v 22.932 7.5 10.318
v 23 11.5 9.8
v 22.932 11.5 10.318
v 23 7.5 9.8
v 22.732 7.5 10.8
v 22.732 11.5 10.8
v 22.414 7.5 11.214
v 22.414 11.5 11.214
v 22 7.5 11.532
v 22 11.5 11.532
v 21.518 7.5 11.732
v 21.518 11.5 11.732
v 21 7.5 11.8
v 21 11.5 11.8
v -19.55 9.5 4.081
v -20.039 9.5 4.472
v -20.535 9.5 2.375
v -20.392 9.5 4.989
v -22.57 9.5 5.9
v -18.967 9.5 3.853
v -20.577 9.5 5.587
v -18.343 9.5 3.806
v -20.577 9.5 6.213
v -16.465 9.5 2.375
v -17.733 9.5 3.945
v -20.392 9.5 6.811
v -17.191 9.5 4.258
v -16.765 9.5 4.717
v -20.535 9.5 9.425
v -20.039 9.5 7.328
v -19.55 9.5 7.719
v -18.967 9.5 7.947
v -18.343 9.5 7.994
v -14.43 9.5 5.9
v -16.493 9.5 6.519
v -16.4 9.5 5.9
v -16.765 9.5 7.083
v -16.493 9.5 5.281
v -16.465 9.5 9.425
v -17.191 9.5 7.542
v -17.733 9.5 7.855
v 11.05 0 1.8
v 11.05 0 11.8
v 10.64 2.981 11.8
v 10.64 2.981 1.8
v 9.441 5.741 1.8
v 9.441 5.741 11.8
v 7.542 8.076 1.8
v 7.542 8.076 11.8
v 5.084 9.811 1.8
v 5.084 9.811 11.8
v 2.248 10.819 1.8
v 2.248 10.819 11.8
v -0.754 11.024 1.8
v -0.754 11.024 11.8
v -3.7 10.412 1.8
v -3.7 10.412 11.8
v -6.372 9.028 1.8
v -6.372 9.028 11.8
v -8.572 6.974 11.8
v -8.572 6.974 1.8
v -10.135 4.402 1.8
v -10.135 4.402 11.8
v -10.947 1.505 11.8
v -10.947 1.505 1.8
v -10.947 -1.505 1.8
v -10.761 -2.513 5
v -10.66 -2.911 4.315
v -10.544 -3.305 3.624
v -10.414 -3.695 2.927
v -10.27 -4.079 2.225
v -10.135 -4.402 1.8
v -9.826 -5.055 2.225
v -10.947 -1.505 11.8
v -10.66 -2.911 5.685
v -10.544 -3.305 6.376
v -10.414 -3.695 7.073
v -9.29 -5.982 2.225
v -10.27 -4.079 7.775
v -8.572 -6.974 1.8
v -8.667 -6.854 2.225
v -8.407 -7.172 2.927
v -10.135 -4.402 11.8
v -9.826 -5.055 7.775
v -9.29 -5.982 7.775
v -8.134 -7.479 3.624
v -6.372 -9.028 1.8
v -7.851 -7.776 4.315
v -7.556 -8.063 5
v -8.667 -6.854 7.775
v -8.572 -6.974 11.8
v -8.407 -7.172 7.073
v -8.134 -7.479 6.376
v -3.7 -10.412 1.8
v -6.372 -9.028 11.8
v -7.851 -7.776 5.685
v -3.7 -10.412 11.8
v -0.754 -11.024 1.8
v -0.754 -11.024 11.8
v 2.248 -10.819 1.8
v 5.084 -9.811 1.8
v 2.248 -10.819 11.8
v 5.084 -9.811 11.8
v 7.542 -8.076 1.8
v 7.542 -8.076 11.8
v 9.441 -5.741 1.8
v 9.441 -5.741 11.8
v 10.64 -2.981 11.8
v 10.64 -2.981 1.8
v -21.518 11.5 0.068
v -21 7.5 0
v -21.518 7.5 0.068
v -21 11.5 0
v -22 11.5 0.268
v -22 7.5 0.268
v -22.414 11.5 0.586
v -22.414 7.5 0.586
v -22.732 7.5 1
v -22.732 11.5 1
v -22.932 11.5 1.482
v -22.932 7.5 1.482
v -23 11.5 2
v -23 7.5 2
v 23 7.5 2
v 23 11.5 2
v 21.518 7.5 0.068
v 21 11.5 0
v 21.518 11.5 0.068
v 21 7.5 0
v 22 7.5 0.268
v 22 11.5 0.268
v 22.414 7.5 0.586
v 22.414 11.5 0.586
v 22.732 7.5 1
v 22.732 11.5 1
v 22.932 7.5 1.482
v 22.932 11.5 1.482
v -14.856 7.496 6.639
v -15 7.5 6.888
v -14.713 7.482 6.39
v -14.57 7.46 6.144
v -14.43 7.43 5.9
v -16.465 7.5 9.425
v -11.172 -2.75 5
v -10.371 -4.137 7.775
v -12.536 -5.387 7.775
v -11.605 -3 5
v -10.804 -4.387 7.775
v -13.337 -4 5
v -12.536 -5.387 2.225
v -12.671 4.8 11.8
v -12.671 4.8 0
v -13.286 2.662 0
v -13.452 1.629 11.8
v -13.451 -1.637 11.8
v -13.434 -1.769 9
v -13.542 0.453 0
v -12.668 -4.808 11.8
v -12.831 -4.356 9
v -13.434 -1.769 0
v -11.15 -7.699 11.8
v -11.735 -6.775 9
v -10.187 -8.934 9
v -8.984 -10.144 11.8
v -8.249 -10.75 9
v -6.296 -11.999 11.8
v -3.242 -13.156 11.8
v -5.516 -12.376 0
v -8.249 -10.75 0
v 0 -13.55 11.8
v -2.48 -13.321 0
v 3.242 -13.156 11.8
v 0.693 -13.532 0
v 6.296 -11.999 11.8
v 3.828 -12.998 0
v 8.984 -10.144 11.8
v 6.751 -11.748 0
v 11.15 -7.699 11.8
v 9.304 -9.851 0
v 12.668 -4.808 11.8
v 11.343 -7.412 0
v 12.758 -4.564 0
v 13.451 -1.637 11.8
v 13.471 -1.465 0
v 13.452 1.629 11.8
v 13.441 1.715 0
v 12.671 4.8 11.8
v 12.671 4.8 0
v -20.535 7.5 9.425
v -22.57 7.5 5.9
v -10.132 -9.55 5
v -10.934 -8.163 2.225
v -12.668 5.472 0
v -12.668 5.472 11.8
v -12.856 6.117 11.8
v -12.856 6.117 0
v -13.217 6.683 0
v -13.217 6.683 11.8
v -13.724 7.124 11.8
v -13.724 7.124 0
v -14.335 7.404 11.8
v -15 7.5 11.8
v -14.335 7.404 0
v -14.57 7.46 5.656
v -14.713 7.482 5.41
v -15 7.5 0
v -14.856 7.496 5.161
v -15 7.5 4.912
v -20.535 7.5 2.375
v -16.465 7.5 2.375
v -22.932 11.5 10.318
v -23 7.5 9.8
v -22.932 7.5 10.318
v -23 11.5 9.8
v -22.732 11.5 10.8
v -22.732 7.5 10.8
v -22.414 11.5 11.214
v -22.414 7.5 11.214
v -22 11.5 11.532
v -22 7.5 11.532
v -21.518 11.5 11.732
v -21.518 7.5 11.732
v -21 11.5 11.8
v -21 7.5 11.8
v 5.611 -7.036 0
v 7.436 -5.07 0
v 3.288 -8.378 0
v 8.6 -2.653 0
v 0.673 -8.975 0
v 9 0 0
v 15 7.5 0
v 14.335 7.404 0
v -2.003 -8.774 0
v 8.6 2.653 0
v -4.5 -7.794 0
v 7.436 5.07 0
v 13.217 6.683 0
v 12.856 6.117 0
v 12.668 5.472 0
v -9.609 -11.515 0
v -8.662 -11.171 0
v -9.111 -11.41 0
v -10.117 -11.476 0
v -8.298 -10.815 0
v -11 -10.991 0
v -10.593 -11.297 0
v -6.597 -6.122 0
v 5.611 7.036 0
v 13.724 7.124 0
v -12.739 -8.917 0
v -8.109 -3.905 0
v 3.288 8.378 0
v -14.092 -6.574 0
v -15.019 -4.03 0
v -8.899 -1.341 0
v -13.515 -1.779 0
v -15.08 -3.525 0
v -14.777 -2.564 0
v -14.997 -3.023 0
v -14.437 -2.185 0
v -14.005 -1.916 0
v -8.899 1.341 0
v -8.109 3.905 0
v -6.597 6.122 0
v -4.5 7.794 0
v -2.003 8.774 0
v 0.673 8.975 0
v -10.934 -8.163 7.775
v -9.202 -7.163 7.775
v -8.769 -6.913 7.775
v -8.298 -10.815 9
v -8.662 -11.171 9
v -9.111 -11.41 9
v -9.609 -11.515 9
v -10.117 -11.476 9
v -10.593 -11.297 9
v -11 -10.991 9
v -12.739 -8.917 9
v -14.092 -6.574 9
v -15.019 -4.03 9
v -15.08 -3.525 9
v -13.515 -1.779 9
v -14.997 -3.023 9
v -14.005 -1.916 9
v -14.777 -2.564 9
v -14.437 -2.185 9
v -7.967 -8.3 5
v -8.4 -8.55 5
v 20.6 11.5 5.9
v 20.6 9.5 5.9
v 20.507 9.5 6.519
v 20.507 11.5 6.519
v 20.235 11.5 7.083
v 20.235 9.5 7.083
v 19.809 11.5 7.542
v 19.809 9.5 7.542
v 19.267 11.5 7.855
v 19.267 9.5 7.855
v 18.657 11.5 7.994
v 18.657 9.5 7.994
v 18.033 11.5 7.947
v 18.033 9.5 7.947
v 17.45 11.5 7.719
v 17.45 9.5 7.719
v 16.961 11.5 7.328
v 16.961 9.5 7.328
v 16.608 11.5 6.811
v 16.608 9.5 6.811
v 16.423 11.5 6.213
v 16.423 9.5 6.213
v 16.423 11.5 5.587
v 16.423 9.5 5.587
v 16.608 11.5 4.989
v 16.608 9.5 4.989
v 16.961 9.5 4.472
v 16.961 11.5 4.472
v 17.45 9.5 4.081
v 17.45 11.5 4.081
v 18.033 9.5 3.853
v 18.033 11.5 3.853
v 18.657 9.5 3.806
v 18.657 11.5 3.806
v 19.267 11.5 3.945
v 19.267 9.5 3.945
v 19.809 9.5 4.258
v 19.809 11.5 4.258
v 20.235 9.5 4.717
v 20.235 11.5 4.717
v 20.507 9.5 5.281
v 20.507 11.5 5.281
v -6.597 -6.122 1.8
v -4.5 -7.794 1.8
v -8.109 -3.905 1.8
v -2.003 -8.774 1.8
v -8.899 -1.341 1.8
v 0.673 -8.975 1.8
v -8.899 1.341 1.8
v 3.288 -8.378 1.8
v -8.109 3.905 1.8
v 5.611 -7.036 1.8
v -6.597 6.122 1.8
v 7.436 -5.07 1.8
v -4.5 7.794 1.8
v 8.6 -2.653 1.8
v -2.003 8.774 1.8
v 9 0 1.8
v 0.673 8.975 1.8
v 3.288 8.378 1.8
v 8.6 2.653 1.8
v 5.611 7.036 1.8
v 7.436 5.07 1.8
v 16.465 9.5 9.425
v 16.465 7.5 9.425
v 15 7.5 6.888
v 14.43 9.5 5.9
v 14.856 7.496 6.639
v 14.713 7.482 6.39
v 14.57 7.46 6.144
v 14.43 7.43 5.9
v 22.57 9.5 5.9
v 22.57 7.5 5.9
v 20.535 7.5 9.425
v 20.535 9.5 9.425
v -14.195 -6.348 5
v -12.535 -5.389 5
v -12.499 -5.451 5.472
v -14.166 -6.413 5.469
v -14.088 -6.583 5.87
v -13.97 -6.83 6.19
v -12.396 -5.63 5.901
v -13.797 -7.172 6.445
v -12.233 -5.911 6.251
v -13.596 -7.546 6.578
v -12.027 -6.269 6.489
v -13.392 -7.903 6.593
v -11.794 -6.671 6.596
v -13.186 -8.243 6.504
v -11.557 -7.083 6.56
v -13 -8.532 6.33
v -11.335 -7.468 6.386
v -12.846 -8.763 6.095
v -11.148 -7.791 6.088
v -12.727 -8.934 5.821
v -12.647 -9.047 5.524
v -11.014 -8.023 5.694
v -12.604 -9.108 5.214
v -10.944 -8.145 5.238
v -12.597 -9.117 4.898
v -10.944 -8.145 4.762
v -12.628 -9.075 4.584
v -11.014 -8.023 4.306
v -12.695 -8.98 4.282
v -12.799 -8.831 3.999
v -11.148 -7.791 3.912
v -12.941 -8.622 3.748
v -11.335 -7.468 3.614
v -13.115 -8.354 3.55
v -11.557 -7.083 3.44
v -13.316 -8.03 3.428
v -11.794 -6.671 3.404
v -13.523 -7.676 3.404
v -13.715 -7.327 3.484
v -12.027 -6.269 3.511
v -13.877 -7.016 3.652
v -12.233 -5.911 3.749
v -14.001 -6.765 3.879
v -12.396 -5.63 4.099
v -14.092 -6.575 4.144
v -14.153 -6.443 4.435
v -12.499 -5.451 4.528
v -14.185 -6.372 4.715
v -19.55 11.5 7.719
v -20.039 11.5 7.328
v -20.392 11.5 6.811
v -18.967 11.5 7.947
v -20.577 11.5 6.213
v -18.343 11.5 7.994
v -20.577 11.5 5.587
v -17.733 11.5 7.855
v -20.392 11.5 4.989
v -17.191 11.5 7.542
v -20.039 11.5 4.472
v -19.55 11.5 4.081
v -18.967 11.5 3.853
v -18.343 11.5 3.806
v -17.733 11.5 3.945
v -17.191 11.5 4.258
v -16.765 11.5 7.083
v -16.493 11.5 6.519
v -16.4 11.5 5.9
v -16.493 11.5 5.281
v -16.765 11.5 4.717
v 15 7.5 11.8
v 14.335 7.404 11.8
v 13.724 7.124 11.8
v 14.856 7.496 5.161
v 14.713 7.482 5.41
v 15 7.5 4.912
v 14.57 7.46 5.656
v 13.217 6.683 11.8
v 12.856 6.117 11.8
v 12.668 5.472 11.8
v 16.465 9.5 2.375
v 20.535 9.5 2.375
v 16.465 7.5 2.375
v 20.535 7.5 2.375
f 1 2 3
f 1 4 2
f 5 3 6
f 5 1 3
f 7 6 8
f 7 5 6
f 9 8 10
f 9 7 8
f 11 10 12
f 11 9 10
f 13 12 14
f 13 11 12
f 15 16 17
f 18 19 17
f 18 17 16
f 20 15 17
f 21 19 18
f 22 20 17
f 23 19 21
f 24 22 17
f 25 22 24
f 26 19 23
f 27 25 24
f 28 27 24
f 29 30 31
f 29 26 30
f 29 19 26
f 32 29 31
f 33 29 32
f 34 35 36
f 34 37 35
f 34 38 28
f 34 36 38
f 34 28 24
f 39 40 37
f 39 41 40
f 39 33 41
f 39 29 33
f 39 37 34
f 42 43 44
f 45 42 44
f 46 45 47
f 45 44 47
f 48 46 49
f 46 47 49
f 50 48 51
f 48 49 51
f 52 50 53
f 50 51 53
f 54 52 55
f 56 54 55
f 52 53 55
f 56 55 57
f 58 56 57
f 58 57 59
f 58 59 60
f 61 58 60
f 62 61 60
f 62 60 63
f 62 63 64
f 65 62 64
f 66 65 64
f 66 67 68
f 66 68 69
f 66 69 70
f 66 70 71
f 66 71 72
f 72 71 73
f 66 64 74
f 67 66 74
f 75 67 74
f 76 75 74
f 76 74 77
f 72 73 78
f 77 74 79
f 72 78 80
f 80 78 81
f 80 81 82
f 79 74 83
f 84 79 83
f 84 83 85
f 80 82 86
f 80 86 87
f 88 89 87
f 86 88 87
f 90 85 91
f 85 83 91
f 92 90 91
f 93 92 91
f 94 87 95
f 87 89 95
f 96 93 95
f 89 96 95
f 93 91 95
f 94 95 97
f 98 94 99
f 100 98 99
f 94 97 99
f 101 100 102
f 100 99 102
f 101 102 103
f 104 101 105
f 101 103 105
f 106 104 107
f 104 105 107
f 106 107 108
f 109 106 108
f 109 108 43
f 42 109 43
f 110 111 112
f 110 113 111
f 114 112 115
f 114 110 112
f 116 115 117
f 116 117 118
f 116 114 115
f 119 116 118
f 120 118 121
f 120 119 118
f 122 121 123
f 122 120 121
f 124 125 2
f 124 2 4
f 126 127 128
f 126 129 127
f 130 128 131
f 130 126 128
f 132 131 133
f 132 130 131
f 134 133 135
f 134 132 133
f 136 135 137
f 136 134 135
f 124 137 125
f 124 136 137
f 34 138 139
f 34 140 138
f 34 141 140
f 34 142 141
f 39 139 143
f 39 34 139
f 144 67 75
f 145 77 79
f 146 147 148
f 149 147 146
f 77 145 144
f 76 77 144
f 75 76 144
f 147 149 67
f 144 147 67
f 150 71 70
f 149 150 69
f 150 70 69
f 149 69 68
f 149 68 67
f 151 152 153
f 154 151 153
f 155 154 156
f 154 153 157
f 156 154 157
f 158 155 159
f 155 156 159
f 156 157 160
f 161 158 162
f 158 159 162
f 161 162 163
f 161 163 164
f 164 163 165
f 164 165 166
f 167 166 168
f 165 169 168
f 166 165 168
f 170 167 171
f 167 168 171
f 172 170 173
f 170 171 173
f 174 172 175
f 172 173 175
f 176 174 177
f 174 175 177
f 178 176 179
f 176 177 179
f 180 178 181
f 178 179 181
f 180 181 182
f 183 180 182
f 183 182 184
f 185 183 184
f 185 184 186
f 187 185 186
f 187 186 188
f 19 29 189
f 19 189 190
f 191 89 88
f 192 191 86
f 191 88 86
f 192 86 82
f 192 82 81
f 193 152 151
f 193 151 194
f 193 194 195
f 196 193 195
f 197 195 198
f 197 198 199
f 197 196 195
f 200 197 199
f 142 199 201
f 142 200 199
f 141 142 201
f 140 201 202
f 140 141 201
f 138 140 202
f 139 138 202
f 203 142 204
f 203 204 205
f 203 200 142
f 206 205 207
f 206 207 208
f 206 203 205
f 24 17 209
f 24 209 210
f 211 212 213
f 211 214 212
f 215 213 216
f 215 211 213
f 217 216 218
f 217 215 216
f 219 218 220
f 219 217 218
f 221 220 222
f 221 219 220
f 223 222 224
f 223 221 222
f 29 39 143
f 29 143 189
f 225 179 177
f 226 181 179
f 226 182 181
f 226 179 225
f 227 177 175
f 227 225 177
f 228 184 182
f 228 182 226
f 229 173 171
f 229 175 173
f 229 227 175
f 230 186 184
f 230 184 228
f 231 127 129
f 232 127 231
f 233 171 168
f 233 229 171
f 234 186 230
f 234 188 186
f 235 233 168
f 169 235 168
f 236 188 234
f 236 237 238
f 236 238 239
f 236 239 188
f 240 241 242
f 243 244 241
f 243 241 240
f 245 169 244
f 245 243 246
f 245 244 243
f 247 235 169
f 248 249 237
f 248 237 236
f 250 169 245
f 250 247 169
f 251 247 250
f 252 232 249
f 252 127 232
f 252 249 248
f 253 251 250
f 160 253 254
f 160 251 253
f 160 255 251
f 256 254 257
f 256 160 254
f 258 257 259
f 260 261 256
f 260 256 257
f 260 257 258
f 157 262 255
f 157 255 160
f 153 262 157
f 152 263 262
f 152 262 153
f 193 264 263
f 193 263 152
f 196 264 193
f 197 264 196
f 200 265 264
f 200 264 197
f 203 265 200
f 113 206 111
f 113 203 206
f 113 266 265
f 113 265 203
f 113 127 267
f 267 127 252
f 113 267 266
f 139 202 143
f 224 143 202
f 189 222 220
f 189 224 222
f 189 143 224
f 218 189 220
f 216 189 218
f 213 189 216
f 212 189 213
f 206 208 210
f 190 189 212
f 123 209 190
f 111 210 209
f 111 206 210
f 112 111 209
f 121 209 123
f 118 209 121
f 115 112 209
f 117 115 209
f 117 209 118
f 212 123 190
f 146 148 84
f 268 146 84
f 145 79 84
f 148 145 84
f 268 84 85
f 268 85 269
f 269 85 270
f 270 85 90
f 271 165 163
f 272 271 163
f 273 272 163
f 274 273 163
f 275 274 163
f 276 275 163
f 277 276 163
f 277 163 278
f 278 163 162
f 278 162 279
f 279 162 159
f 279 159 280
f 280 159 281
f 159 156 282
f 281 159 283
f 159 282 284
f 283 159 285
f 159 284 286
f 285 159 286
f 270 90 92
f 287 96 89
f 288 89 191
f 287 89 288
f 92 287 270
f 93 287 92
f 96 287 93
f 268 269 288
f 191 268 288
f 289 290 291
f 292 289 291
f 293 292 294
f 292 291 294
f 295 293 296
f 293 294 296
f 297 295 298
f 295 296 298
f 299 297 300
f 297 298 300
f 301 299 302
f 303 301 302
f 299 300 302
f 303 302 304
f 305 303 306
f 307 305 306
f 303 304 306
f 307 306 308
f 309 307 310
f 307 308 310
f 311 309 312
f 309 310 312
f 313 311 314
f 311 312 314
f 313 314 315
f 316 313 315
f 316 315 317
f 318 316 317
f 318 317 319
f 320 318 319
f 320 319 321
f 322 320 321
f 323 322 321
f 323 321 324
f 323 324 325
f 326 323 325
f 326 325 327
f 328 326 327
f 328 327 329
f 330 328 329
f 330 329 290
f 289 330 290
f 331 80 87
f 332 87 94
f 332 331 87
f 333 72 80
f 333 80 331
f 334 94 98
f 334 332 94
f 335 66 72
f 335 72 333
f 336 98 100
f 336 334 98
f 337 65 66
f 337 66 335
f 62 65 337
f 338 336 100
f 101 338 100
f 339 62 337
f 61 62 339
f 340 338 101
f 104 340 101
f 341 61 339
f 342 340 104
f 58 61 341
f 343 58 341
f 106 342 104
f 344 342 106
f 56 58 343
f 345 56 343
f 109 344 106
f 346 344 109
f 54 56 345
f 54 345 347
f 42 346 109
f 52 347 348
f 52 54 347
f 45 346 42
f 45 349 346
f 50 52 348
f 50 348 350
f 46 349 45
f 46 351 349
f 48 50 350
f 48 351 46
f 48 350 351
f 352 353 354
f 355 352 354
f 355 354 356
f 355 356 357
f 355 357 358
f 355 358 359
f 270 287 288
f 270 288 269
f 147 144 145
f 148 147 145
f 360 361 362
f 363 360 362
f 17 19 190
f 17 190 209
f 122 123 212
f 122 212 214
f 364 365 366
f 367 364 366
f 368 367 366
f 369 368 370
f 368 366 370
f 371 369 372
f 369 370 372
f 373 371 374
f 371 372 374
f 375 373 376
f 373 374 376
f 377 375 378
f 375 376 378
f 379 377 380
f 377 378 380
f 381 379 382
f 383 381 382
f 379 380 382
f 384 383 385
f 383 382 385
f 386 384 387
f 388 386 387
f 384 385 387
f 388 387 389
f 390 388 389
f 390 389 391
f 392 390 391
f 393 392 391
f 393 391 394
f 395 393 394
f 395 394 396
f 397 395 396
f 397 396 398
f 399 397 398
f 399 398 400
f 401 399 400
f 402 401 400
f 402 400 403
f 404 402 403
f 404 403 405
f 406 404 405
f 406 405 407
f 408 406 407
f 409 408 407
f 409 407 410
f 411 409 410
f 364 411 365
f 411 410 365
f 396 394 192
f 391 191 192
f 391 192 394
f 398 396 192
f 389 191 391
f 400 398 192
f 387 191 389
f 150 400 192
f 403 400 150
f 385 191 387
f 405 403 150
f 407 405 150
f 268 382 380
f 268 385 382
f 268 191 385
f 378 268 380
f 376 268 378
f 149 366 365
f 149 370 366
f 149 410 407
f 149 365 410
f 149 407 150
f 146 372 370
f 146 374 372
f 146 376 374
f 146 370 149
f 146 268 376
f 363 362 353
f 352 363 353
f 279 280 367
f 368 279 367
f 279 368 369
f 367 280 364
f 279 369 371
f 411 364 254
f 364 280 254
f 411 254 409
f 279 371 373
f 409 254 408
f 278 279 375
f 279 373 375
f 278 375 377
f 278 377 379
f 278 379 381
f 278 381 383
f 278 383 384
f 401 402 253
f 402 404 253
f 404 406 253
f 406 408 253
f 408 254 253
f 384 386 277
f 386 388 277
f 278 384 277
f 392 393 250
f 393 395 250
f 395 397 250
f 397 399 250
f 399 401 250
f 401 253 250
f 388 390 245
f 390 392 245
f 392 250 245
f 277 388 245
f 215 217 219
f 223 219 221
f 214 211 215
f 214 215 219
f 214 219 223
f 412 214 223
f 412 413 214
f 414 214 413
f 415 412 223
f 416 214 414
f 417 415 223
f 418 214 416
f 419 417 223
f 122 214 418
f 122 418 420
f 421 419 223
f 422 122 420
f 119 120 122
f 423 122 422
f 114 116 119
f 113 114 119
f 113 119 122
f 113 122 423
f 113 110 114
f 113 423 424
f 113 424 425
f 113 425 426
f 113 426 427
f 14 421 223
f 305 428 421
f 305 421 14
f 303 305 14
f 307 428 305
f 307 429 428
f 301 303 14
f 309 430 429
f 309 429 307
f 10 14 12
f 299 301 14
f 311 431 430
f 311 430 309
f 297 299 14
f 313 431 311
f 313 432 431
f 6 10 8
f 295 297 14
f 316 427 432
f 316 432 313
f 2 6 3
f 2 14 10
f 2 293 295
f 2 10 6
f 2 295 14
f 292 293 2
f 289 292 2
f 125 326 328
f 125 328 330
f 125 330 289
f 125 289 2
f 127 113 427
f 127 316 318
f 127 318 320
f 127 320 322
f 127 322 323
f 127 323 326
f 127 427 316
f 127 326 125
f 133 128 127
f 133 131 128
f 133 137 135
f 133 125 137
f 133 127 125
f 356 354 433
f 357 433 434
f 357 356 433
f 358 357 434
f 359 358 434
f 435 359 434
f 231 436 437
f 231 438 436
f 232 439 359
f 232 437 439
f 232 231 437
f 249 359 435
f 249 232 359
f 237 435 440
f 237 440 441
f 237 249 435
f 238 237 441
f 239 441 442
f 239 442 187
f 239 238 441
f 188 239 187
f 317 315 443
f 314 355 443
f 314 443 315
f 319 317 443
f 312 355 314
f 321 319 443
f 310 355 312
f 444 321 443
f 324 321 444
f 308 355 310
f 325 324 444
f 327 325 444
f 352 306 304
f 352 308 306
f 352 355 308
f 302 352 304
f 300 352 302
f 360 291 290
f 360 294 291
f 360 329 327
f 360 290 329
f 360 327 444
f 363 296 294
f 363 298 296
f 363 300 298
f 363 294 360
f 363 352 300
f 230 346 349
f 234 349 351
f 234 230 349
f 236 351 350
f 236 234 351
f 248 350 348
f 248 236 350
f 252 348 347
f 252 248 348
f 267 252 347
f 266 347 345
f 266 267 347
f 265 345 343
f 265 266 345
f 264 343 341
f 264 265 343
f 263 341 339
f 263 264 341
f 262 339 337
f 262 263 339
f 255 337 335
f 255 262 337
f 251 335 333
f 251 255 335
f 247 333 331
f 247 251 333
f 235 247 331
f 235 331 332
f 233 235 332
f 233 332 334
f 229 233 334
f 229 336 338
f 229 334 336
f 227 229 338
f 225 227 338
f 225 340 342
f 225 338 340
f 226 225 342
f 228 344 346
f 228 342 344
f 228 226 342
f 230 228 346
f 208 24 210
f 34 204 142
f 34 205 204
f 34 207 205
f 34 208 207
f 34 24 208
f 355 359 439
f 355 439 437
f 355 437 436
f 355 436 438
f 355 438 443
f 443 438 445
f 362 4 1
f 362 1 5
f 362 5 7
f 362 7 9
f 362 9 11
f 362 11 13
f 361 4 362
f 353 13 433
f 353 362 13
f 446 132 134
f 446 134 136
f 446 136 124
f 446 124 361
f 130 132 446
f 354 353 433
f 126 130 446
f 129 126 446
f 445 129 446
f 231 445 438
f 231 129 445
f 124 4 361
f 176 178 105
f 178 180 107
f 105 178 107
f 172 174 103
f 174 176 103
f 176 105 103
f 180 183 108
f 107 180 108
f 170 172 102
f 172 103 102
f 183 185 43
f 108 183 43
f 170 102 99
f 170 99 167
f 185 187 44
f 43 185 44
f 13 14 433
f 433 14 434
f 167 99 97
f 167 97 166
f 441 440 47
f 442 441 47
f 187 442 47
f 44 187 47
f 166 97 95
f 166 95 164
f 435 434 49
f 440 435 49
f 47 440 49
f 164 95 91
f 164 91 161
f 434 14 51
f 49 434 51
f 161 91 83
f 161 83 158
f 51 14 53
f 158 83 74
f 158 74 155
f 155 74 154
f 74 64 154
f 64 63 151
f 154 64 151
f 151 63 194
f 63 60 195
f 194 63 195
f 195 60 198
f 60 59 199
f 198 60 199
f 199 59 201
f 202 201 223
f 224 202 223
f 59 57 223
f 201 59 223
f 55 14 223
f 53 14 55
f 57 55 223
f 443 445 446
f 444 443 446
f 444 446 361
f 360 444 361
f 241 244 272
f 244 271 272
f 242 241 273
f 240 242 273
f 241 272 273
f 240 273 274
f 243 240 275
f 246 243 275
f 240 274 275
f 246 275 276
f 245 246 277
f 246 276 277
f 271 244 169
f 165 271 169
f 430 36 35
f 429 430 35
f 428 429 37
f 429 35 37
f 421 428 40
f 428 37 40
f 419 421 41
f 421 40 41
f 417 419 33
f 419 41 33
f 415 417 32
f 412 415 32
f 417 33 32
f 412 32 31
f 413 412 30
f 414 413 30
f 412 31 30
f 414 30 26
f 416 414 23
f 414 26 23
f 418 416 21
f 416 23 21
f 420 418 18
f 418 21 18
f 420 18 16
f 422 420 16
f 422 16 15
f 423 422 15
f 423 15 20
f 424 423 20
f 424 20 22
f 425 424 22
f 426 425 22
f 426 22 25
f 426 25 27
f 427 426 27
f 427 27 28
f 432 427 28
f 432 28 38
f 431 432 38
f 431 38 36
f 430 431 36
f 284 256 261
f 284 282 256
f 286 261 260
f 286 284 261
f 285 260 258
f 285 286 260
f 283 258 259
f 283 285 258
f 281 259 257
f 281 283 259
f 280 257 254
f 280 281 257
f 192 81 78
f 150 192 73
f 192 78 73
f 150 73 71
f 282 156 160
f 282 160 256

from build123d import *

# Parameters (mm, degrees)
PAD002_DEPTH    = 5.55
POCKET001_DEPTH = 0.5
POCKET002_DEPTH = 0.5
PAD003_DEPTH    = 2.5
PAD001_DEPTH    = 9
SKETCH_R        = 9
PAD_DEPTH       = 11.8
SKETCH001_R     = 11.05
POCKET_DEPTH    = 10
SKETCH010_R     = 1.6
POCKET003_DEPTH = 5
FILLET_R        = 1.8
SKETCH011_R     = 2.1
POCKET004_DEPTH = 5
POCKET005_DEPTH = 2
FILLET001_R     = 2


with BuildPart() as pad003:
    # Sketch004 → Pad002 (new body)
    with BuildSketch(Plane.XY.offset(2.225)):
        Polygon((-11.1717282118, -2.7499991288), (-7.9674332118, -8.3000008712), (-8.4004459137, -8.5500008712), (-11.6047409137, -2.9999991288), align=None)
    extrude(amount=PAD002_DEPTH)

    # Sketch006 → Pocket001 (cut)
    with BuildSketch(Plane(origin=(-9.5695807118, -5.525, 2.225), x_dir=(-0.5, 0.8660254038, 0), z_dir=(0.8660254038, 0.5, 0))):
        Polygon((-3.204295, 2.7750019602), (-1.6021491347, 5.55), (-3.204295, 5.55), align=None)
        Polygon((1.6021478772, 0), (3.204295, 0), (3.204295, 2.7750019602), align=None)
    extrude(amount=-POCKET001_DEPTH, mode=Mode.SUBTRACT)

    # Sketch008 → Pocket002 (cut)
    with BuildSketch(Plane(origin=(-9.5695807118, -5.525, 2.225), x_dir=(-0.5, 0.8660254038, 0), z_dir=(0.8660254038, 0.5, 0))):
        Polygon((1.6021478772, 5.5500030493), (3.204295, 5.5500030493), (3.204295, 2.7750019602), align=None)
        Polygon((-1.6021478772, 0), (-3.2042957545, 0), (-3.2042957545, 2.7750015246), align=None)
    extrude(amount=-POCKET002_DEPTH, mode=Mode.SUBTRACT)

    # Sketch009 → Pad003 (new body, symmetric)
    with BuildSketch(Plane(origin=(-9.5695807118, -5.525, 2.225), x_dir=(-0.5, 0.8660254038, 0), z_dir=(0.8660254038, 0.5, 0))):
        Polygon((1.6021491347, -7.4054e-06), (3.2042982695, 2.7749962973), (1.6021491347, 5.55), (-1.6021491347, 5.55), (-3.2042982695, 2.7749962973), (-1.6021491347, -7.4054e-06), align=None)
    extrude(amount=PAD003_DEPTH, both=True)


with BuildPart() as pad001:
    # Sketch003 → Pad001 (new body)
    with BuildSketch(Plane.XY):
        with BuildLine():
            ThreePointArc((-10.9554657182, -1.442314424), (-9.5695807118, -5.525), (-6.7268137905, -8.7665544102))
            Line((-9.4662402211, -12.3366444415), (-6.7268137905, -8.7665544102))
            ThreePointArc((-15.4169675944, -2.029682289), (-13.4666950288, -7.775), (-9.4662402211, -12.3366444415))
            Line((-10.9554657182, -1.442314424), (-15.4169675944, -2.029682289))
        make_face()
    extrude(amount=PAD001_DEPTH)


with BuildPart() as fillet001:
    # Sketch → Pad (new body)
    with BuildSketch(Plane.XY):
        with BuildLine():
            Line((-23, 11.5), (23, 11.5))
            Line((23, 11.5), (23, 7.5))
            Line((23, 7.5), (15, 7.5))
            ThreePointArc((15, 7.5), (13.217253485, 6.6833607789), (12.6713258975, 4.8))
            ThreePointArc((-12.6713258975, 4.8), (0, -13.55), (12.6713258975, 4.8))
            ThreePointArc((-12.6713258975, 4.8), (-13.217253485, 6.6833607789), (-15, 7.5))
            Line((-15, 7.5), (-23, 7.5))
            Line((-23, 7.5), (-23, 11.5))
        make_face()
        Circle(SKETCH_R, mode=Mode.SUBTRACT)
    extrude(amount=PAD_DEPTH)

    # Sketch001 → Pocket (cut)
    with BuildSketch(Plane.XY.offset(11.8)):
        Circle(SKETCH001_R)
    extrude(amount=-POCKET_DEPTH, mode=Mode.SUBTRACT)

    # Fusion: union Pad001
    add(pad001.part)

    # Cut: cut Pad003
    add(pad003.part, mode=Mode.SUBTRACT)

    # Sketch010 → Pocket003 (cut)
    with BuildSketch(Plane(origin=(-11.7346442213, -6.775, 0), x_dir=(-0.5, 0.8660254038, 0), z_dir=(0.8660254038, 0.5, 0))):
        with Locations((0, 4.9999962973)):
            Circle(SKETCH010_R)
    extrude(amount=-POCKET003_DEPTH, mode=Mode.SUBTRACT)

    # Fillet
    fillet_edges = [fillet001.edges().sort_by_distance(p)[0] for p in [
        (-15.416968, -2.029682, 4.5),
        (-9.46624, -12.336644, 4.5),
    ]]
    fillet(fillet_edges, radius=FILLET_R)

    # Sketch011 → Pocket004 (cut)
    with BuildSketch(Plane.XZ.offset(-7.5)):
        with Locations((-18.5, 5.9)):
            Circle(SKETCH011_R)
        with Locations((18.5, 5.9)):
            Circle(SKETCH011_R)
    extrude(amount=-POCKET004_DEPTH, mode=Mode.SUBTRACT)

    # Sketch012 → Pocket005 (cut, symmetric)
    with BuildSketch(Plane.XZ.offset(-7.5)):
        Polygon((-20.5351596989, 2.375), (-16.4648403011, 2.375), (-14.4296806022, 5.9), (-16.4648403011, 9.425), (-20.5351596989, 9.425), (-22.5703193978, 5.9), align=None)
        Polygon((16.4648403011, 2.375), (20.5351596989, 2.375), (22.5703193978, 5.9), (20.5351596989, 9.425), (16.4648403011, 9.425), (14.4296806022, 5.9), align=None)
    extrude(amount=POCKET005_DEPTH, both=True, mode=Mode.SUBTRACT)

    # Fillet001
    fillet001_edges = [fillet001.edges().sort_by_distance(p)[0] for p in [
        (-23, 9.5, 0),
        (-23, 9.5, 11.8),
        (23, 9.5, 0),
        (23, 9.5, 11.8),
    ]]
    fillet(fillet001_edges, radius=FILLET001_R)


solid = fillet001.part
